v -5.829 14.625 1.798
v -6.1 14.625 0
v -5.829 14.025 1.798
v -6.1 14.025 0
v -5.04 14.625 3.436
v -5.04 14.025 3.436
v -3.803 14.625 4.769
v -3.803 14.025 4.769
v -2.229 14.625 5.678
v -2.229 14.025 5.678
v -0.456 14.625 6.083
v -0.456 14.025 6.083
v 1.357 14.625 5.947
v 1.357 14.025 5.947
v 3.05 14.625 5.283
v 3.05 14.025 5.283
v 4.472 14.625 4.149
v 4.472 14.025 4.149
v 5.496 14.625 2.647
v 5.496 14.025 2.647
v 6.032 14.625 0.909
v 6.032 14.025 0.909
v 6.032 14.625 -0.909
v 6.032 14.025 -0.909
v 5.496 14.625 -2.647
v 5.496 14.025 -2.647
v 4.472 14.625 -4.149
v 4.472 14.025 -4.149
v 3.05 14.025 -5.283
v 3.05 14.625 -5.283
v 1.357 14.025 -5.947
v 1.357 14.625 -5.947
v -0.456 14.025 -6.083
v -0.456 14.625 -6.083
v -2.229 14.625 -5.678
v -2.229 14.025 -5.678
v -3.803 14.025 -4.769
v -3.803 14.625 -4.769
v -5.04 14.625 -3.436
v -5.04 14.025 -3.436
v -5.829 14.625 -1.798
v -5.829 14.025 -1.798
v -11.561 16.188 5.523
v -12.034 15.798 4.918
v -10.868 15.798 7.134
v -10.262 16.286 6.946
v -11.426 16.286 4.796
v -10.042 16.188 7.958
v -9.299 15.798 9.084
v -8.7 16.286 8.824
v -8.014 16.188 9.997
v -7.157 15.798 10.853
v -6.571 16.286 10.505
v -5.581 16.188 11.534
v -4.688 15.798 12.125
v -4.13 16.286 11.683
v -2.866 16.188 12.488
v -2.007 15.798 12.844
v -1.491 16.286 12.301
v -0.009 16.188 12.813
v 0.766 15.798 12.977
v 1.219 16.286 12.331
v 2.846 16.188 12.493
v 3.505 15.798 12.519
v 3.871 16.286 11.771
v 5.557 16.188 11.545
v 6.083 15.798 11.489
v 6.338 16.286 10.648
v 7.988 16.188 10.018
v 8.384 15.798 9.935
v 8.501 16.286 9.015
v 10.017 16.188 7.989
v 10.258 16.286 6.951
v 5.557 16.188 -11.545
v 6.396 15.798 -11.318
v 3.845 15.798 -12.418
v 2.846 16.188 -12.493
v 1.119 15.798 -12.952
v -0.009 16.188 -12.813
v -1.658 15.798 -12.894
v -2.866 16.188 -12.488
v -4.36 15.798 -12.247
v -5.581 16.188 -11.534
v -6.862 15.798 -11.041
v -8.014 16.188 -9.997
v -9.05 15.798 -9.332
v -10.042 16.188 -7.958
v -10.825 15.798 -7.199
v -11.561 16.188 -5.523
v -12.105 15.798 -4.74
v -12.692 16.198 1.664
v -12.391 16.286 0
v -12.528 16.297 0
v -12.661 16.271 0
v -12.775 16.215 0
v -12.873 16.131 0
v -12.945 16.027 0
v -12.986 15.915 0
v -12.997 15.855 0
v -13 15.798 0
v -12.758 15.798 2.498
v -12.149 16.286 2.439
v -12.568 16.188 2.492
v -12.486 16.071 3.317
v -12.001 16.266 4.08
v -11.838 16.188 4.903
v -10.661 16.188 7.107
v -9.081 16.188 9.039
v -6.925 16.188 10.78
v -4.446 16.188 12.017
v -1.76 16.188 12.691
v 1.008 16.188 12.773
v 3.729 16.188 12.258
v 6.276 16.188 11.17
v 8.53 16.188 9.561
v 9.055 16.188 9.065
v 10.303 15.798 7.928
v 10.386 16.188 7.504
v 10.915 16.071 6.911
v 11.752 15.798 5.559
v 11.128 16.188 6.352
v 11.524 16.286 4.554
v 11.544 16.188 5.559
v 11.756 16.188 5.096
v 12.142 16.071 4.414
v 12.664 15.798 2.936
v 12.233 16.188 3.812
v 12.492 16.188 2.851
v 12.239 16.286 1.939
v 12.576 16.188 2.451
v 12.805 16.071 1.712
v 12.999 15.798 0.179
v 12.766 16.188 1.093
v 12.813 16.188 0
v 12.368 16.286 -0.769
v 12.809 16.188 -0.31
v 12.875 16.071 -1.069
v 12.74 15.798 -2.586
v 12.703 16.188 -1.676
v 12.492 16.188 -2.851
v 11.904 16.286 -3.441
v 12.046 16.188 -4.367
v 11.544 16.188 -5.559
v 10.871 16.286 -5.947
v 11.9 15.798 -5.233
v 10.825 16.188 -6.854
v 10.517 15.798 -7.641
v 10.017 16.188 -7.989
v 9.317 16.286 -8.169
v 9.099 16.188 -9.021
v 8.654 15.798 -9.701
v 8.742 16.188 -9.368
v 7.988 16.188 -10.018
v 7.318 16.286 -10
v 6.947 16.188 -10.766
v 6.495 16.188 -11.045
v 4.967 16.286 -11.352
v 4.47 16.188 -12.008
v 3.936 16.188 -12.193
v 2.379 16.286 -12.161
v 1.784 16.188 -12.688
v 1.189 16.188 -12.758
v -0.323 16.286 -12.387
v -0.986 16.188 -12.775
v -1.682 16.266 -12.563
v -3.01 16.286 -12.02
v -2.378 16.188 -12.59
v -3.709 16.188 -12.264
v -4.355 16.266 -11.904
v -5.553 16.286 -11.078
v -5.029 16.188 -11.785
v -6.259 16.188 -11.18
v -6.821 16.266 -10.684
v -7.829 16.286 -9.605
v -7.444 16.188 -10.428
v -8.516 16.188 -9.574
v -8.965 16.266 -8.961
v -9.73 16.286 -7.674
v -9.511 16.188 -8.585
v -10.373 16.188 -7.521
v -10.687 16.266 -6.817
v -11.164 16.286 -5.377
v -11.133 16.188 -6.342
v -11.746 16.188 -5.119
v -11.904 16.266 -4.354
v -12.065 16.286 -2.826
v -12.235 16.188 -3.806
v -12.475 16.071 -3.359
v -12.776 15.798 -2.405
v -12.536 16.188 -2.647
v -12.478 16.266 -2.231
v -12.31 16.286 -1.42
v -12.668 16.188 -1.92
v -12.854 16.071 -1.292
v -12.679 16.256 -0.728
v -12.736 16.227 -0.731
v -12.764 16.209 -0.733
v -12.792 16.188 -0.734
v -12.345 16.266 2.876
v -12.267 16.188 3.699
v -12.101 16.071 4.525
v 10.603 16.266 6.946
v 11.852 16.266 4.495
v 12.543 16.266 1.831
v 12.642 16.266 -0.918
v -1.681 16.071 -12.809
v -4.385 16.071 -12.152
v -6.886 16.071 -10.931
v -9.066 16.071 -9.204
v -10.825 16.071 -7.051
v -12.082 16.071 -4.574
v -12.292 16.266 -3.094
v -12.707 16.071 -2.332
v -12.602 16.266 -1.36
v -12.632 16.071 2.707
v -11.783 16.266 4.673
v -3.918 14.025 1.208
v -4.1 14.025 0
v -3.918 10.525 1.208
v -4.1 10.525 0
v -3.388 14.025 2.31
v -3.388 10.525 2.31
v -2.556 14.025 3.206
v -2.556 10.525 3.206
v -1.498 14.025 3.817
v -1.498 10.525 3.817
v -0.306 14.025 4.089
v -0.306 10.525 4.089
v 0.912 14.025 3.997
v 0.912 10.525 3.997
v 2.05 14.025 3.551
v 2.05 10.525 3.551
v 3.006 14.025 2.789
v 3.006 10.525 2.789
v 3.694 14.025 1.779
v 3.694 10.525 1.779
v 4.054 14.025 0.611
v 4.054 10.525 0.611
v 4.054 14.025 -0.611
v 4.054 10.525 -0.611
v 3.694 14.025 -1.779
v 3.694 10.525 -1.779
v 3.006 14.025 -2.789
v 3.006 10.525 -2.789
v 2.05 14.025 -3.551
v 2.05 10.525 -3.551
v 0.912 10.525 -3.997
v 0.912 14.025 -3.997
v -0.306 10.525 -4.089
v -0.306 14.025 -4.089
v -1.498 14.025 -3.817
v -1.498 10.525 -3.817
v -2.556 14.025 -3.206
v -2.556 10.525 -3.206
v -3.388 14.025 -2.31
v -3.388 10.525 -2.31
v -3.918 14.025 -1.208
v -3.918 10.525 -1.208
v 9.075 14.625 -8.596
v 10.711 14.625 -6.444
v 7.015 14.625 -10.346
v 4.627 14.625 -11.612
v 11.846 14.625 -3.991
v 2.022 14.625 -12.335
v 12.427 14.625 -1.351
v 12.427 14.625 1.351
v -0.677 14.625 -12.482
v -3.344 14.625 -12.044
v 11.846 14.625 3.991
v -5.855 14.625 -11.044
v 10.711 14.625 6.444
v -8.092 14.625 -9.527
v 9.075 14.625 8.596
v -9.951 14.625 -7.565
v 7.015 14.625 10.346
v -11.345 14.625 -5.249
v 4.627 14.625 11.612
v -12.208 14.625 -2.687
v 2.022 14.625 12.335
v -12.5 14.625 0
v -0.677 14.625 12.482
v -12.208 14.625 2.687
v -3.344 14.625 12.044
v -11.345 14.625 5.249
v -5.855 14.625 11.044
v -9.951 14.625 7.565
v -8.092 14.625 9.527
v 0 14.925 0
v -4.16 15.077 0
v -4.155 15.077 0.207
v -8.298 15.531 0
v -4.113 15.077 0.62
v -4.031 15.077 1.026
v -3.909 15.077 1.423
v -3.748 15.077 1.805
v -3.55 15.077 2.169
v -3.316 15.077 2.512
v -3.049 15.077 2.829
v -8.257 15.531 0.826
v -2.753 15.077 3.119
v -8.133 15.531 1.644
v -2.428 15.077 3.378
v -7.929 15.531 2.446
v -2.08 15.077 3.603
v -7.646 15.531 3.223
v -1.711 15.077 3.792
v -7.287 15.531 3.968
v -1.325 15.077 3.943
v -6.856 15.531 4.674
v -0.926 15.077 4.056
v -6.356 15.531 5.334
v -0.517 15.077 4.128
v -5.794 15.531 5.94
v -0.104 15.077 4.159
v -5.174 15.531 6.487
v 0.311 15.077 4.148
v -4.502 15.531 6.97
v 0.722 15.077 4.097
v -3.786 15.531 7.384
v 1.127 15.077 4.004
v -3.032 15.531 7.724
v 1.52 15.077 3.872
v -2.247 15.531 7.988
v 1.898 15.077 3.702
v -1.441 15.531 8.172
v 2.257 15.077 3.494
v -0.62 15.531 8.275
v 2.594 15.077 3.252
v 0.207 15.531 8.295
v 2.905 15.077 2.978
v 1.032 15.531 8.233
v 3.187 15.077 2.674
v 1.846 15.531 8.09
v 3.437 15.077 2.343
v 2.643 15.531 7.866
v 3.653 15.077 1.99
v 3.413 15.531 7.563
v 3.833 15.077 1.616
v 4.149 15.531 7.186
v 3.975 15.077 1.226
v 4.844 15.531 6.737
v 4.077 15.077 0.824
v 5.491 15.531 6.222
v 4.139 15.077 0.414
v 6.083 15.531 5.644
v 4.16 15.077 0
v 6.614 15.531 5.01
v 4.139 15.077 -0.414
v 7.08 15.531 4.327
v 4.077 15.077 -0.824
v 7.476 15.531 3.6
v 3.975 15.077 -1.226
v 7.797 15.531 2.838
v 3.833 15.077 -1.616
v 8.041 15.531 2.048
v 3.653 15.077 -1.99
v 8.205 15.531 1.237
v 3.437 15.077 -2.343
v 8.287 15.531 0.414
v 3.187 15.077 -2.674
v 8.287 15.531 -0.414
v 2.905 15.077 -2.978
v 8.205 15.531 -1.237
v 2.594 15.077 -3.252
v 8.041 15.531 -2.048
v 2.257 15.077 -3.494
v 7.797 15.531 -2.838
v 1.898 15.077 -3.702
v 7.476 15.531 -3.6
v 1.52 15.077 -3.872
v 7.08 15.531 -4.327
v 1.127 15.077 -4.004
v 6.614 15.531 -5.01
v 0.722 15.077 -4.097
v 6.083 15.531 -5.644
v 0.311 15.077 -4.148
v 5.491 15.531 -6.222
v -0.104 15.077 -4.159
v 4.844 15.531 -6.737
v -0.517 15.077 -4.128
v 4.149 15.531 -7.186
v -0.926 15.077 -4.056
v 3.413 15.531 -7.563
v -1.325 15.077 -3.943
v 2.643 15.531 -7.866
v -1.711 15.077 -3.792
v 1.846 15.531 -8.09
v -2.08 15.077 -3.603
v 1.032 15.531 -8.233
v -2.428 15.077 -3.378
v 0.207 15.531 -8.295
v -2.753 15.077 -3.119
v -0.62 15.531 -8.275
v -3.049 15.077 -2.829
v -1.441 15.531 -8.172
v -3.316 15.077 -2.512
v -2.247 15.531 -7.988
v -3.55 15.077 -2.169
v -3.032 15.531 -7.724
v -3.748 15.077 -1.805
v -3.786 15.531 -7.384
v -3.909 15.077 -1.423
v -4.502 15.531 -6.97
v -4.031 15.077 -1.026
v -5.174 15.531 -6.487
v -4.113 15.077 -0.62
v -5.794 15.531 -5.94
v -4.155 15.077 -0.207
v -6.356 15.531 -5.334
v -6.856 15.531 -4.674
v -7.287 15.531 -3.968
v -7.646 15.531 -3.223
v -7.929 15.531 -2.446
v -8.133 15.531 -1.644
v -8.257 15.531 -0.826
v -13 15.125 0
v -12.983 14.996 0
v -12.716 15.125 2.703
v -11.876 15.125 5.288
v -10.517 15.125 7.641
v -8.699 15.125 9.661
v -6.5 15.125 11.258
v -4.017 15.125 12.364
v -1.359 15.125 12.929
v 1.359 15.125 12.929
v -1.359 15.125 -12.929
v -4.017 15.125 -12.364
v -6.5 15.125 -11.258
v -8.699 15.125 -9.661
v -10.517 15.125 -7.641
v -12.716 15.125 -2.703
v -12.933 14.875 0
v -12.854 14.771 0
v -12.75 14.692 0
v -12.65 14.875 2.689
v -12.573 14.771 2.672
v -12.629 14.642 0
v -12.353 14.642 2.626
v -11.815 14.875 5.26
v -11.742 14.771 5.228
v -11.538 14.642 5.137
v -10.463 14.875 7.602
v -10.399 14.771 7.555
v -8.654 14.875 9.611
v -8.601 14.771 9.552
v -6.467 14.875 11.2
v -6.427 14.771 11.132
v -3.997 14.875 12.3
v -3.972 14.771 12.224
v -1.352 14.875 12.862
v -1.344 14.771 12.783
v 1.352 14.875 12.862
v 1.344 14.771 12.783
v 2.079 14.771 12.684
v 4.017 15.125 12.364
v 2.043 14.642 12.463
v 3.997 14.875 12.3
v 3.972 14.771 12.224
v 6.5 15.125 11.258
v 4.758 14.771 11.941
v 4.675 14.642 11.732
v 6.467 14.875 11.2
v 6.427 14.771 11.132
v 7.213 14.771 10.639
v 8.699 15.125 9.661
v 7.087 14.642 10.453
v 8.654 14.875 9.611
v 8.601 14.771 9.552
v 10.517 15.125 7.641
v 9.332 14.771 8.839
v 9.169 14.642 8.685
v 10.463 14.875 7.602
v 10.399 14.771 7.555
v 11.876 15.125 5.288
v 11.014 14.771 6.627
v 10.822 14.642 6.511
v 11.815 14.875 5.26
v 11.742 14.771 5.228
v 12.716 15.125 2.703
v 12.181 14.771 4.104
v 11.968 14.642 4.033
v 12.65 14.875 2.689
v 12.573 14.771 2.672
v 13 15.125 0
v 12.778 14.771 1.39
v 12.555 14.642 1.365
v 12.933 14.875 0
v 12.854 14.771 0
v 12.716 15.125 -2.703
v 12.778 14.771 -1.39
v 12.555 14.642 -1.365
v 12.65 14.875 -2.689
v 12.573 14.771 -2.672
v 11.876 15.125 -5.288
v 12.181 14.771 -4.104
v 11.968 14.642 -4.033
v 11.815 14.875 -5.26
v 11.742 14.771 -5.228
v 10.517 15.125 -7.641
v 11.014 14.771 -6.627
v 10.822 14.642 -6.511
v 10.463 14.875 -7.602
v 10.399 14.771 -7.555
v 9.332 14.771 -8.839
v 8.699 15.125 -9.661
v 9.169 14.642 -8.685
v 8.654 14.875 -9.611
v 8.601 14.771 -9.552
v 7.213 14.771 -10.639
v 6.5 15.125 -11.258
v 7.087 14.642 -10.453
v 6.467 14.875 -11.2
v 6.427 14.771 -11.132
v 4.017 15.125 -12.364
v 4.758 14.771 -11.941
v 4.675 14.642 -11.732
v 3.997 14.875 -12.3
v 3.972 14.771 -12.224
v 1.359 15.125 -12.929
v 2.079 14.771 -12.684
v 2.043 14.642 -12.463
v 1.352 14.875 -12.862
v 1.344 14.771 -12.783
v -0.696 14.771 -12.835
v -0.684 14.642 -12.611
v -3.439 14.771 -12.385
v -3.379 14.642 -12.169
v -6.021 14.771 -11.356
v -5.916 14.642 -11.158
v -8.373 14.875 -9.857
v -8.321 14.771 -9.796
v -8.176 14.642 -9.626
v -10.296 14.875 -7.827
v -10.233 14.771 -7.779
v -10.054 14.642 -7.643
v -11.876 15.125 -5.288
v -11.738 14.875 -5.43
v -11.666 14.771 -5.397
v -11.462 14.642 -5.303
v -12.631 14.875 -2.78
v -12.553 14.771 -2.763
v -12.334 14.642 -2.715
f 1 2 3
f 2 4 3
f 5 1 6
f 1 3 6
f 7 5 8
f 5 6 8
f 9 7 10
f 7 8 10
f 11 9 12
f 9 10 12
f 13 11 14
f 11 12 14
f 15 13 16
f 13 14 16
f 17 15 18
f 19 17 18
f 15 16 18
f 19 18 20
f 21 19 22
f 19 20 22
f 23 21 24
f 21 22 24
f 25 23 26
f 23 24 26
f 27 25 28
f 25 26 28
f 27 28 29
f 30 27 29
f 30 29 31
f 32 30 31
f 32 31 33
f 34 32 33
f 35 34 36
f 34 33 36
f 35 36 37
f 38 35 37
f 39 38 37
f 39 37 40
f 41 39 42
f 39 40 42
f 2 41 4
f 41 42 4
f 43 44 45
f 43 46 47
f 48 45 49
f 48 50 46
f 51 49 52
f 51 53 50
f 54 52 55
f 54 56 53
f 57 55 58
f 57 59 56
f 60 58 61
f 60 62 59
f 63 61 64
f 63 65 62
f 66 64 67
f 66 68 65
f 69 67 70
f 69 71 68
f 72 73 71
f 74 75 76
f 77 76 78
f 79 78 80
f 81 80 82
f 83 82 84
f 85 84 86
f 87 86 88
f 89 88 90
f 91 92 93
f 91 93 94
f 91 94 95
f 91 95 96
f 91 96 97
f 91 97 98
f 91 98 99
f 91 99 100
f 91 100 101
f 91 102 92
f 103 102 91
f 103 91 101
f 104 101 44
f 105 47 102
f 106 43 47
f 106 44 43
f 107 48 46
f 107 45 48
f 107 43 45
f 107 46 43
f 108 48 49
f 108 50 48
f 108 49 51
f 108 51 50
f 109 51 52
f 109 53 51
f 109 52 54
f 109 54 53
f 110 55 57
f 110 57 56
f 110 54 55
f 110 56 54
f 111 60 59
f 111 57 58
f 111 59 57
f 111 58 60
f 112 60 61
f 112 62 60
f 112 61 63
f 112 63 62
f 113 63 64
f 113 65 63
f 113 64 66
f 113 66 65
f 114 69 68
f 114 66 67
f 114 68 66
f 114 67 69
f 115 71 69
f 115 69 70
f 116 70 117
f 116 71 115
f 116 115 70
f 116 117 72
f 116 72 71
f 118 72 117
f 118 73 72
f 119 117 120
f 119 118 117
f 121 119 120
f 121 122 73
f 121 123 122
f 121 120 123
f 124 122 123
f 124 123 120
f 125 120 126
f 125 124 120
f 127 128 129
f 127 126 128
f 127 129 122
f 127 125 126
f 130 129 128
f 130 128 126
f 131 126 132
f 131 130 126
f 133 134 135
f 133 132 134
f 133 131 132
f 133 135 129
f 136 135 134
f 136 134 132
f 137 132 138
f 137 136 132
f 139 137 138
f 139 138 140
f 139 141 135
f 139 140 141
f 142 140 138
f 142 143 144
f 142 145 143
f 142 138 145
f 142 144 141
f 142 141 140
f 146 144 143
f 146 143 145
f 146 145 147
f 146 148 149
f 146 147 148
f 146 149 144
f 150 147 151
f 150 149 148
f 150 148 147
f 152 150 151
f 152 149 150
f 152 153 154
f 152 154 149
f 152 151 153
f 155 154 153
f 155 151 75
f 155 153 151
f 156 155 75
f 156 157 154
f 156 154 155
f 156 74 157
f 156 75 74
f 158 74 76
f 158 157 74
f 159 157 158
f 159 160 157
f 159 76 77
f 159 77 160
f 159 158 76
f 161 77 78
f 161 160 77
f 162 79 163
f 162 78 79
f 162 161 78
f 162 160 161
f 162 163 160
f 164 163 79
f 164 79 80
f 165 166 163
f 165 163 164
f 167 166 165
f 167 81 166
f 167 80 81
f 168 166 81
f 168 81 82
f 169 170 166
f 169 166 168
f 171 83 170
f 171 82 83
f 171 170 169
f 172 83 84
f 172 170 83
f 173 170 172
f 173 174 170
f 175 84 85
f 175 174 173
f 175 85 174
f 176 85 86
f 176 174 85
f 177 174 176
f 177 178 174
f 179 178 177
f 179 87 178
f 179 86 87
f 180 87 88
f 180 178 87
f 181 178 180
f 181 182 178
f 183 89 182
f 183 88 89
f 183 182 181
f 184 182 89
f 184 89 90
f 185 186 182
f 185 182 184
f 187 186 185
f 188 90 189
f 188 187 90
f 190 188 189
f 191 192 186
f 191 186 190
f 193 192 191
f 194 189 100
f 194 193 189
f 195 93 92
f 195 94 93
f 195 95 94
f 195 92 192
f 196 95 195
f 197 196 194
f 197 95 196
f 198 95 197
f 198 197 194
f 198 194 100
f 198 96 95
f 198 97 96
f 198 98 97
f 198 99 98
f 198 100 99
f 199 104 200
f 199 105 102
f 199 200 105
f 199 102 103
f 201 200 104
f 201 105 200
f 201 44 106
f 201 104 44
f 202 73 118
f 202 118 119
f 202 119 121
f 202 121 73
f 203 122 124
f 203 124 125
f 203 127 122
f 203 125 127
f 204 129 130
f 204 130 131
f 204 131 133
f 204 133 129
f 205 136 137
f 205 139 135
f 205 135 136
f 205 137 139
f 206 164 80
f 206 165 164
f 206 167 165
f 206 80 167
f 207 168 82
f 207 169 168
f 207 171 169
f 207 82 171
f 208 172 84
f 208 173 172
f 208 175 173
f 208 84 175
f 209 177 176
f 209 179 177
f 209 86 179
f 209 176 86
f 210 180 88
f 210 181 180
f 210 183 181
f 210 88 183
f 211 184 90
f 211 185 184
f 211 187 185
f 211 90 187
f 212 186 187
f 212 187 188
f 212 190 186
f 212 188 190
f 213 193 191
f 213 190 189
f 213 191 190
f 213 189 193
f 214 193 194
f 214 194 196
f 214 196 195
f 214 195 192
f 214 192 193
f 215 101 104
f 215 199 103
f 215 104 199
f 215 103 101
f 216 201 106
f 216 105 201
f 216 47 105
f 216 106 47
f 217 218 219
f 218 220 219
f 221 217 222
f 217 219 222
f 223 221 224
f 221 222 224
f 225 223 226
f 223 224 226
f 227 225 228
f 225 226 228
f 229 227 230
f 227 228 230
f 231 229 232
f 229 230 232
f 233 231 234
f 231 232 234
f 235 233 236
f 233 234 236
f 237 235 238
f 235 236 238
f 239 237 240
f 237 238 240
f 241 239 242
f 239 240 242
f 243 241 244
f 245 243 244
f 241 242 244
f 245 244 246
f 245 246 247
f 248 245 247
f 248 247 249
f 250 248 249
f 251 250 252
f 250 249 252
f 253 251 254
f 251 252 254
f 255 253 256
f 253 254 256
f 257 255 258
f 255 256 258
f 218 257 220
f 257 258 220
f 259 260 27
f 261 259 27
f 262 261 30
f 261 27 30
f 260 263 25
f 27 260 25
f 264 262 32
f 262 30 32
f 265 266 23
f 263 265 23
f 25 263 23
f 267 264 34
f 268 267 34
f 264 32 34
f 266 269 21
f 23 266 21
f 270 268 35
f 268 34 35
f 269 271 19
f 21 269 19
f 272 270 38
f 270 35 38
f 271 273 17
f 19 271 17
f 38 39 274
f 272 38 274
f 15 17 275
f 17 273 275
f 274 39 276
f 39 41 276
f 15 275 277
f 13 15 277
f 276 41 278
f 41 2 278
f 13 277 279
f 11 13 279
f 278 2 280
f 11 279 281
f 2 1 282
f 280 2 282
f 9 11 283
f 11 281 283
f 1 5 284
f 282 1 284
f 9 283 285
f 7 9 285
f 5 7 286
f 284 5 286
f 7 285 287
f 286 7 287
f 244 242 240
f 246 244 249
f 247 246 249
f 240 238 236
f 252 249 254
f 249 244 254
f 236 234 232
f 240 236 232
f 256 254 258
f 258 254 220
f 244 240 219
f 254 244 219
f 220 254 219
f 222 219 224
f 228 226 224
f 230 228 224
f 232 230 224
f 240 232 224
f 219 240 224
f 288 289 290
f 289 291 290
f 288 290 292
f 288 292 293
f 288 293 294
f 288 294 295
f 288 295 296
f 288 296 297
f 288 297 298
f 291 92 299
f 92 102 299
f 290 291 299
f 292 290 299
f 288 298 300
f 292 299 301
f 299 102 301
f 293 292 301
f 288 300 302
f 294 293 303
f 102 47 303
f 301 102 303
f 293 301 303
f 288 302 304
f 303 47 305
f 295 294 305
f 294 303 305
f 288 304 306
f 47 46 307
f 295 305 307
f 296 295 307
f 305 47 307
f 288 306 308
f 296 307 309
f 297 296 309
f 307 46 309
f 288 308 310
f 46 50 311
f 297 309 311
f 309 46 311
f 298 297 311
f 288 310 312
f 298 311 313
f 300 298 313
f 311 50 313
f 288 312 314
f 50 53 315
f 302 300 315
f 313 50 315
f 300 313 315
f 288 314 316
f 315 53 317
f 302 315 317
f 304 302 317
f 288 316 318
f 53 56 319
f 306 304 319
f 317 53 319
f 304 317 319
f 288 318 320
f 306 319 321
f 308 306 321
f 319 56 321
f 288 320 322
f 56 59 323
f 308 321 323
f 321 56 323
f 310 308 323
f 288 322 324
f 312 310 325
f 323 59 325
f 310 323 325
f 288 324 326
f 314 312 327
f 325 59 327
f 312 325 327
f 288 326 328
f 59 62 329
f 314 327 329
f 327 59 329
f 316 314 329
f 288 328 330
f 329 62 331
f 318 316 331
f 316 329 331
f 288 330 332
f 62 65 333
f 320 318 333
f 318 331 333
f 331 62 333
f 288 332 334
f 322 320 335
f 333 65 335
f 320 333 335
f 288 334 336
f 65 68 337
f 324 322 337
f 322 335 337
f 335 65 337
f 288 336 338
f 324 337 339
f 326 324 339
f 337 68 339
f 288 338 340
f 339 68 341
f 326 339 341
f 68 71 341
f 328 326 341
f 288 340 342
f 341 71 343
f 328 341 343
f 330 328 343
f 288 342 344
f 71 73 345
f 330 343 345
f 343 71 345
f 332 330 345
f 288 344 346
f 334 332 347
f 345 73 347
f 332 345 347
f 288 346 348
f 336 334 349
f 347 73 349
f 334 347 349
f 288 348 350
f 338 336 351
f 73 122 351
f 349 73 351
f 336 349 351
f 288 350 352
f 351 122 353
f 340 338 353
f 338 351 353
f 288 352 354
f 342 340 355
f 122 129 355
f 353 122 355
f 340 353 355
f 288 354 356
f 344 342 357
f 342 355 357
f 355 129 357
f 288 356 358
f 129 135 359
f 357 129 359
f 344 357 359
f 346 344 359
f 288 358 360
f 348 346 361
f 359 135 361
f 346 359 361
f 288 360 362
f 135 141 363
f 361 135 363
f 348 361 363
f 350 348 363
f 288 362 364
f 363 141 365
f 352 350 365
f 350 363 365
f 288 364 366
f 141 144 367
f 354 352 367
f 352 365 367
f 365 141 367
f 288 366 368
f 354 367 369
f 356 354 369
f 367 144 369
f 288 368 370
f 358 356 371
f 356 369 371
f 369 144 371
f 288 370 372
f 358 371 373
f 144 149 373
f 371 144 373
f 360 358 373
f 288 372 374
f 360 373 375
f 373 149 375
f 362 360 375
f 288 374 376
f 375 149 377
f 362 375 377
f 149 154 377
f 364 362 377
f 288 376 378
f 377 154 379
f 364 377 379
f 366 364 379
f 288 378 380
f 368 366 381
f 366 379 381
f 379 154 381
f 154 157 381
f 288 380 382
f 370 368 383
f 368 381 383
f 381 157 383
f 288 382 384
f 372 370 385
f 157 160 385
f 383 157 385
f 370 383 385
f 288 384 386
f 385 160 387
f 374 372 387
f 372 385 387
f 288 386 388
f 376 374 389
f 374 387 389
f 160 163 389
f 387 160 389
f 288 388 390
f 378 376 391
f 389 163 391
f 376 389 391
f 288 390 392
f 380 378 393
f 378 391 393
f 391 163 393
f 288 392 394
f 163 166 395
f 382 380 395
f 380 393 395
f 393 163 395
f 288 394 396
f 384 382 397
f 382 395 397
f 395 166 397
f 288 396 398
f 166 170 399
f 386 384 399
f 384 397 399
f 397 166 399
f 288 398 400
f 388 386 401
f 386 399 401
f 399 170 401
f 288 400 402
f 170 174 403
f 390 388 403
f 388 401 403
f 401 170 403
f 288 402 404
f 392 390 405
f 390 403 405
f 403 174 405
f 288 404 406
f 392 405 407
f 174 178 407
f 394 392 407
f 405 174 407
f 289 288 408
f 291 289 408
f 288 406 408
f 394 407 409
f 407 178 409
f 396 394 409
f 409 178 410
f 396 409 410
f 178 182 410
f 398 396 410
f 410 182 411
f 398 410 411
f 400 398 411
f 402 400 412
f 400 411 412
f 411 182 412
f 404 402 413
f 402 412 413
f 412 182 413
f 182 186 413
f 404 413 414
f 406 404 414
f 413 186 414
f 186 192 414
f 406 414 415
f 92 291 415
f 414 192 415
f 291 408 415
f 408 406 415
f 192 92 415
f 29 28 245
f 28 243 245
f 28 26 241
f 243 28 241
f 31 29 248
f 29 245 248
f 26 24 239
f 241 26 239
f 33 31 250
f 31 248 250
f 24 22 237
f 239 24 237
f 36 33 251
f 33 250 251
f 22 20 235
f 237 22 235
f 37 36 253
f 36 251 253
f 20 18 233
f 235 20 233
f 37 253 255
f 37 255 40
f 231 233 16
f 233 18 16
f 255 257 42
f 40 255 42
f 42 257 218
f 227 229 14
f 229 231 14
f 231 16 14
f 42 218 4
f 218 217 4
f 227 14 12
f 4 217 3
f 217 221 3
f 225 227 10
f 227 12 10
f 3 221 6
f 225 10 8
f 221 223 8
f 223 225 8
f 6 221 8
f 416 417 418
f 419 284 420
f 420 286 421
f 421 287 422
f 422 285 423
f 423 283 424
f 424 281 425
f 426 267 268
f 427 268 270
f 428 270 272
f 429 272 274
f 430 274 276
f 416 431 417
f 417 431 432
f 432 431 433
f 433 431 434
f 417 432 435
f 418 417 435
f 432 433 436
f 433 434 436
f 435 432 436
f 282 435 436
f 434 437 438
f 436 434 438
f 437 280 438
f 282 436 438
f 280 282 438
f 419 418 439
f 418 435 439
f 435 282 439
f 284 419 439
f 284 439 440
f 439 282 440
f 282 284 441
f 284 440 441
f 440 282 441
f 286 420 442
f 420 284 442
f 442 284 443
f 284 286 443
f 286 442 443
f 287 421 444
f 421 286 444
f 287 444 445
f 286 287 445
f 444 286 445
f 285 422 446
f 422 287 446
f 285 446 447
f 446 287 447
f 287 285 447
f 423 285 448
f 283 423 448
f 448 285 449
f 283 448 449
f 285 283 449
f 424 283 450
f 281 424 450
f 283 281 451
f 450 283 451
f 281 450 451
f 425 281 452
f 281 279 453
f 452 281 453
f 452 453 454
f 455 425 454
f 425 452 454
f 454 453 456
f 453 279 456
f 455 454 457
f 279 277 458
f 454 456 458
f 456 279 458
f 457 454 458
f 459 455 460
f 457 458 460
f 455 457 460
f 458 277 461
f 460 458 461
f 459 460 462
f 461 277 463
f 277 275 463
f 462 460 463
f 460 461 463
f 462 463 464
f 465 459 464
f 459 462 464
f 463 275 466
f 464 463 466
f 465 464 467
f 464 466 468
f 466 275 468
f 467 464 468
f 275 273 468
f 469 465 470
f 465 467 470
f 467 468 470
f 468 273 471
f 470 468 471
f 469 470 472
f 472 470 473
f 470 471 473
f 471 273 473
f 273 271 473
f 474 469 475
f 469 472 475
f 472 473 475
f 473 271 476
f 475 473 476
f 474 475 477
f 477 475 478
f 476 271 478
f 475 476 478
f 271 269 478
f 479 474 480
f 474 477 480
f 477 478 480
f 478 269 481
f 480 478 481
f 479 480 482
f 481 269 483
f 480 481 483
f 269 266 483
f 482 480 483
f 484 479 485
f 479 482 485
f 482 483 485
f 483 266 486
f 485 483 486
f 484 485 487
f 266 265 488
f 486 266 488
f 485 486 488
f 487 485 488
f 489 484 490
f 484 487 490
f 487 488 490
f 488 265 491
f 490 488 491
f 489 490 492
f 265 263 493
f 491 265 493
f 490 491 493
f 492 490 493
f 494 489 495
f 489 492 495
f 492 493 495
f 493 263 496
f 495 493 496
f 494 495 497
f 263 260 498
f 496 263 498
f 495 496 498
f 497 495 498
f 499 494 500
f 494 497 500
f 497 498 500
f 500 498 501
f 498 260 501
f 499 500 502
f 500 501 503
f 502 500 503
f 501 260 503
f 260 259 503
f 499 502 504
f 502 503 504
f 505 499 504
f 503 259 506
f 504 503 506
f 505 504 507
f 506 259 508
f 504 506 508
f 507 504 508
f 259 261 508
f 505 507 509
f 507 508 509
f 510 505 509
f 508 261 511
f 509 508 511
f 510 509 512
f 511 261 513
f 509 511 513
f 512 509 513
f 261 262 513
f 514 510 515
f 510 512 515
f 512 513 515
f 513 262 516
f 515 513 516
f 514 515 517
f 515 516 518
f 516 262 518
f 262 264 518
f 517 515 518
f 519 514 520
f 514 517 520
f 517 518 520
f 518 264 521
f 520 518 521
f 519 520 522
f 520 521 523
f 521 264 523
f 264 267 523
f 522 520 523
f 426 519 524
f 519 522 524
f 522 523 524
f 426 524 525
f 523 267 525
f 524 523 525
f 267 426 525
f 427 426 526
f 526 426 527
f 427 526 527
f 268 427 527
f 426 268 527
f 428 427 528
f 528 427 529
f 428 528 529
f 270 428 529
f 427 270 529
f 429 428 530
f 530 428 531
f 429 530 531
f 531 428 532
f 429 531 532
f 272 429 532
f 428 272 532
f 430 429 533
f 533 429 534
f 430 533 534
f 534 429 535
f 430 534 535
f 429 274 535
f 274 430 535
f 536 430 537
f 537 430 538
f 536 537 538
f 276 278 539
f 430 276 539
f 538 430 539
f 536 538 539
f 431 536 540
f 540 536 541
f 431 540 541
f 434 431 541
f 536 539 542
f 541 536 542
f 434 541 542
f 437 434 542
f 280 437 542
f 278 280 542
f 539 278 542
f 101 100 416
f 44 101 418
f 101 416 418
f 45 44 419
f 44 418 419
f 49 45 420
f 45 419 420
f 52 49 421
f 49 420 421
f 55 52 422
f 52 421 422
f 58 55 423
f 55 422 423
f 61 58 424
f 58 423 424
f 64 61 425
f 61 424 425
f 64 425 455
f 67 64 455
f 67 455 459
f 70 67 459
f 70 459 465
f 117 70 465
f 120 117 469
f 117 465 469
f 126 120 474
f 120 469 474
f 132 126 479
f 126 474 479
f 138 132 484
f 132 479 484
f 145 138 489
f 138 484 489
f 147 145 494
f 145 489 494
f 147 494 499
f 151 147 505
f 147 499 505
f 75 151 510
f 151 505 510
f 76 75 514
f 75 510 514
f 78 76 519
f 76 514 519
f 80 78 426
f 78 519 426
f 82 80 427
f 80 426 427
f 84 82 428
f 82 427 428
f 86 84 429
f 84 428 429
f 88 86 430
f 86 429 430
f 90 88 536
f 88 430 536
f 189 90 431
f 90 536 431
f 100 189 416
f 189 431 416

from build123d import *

# Parameters (mm, degrees)
F2_R = 0.5


with BuildPart() as f1:
    # F0 (on Top) → F1 (revolve)
    with BuildSketch(Plane.XY):
        with BuildLine():
            ThreePointArc((0, 14.924920715), (-6.5431261642, 15.3011606257), (-13, 16.424920715))
            Line((-13, 16.424920715), (-13, 14.624920715))
            Line((-13, 14.624920715), (-6.1, 14.624920715))
            Line((-6.1, 14.624920715), (-6.1, 14.024920715))
            Line((-6.1, 14.024920715), (-4.1, 14.024920715))
            Line((-4.1, 14.024920715), (-4.1, 10.524920715))
            Line((-4.1, 10.524920715), (0, 10.524920715))
            Line((0, 10.524920715), (0, 14.924920715))
        make_face()
    revolve(axis=Axis((0, 12.724920715, 0), (0, 1, 0)))

    # F2
    f2_edges = [f1.edges().sort_by_distance(p)[0] for p in [
        (13, 14.624921, 0),
        (13, 16.424921, 0),
    ]]
    fillet(f2_edges, radius=F2_R)


solid = f1.part
